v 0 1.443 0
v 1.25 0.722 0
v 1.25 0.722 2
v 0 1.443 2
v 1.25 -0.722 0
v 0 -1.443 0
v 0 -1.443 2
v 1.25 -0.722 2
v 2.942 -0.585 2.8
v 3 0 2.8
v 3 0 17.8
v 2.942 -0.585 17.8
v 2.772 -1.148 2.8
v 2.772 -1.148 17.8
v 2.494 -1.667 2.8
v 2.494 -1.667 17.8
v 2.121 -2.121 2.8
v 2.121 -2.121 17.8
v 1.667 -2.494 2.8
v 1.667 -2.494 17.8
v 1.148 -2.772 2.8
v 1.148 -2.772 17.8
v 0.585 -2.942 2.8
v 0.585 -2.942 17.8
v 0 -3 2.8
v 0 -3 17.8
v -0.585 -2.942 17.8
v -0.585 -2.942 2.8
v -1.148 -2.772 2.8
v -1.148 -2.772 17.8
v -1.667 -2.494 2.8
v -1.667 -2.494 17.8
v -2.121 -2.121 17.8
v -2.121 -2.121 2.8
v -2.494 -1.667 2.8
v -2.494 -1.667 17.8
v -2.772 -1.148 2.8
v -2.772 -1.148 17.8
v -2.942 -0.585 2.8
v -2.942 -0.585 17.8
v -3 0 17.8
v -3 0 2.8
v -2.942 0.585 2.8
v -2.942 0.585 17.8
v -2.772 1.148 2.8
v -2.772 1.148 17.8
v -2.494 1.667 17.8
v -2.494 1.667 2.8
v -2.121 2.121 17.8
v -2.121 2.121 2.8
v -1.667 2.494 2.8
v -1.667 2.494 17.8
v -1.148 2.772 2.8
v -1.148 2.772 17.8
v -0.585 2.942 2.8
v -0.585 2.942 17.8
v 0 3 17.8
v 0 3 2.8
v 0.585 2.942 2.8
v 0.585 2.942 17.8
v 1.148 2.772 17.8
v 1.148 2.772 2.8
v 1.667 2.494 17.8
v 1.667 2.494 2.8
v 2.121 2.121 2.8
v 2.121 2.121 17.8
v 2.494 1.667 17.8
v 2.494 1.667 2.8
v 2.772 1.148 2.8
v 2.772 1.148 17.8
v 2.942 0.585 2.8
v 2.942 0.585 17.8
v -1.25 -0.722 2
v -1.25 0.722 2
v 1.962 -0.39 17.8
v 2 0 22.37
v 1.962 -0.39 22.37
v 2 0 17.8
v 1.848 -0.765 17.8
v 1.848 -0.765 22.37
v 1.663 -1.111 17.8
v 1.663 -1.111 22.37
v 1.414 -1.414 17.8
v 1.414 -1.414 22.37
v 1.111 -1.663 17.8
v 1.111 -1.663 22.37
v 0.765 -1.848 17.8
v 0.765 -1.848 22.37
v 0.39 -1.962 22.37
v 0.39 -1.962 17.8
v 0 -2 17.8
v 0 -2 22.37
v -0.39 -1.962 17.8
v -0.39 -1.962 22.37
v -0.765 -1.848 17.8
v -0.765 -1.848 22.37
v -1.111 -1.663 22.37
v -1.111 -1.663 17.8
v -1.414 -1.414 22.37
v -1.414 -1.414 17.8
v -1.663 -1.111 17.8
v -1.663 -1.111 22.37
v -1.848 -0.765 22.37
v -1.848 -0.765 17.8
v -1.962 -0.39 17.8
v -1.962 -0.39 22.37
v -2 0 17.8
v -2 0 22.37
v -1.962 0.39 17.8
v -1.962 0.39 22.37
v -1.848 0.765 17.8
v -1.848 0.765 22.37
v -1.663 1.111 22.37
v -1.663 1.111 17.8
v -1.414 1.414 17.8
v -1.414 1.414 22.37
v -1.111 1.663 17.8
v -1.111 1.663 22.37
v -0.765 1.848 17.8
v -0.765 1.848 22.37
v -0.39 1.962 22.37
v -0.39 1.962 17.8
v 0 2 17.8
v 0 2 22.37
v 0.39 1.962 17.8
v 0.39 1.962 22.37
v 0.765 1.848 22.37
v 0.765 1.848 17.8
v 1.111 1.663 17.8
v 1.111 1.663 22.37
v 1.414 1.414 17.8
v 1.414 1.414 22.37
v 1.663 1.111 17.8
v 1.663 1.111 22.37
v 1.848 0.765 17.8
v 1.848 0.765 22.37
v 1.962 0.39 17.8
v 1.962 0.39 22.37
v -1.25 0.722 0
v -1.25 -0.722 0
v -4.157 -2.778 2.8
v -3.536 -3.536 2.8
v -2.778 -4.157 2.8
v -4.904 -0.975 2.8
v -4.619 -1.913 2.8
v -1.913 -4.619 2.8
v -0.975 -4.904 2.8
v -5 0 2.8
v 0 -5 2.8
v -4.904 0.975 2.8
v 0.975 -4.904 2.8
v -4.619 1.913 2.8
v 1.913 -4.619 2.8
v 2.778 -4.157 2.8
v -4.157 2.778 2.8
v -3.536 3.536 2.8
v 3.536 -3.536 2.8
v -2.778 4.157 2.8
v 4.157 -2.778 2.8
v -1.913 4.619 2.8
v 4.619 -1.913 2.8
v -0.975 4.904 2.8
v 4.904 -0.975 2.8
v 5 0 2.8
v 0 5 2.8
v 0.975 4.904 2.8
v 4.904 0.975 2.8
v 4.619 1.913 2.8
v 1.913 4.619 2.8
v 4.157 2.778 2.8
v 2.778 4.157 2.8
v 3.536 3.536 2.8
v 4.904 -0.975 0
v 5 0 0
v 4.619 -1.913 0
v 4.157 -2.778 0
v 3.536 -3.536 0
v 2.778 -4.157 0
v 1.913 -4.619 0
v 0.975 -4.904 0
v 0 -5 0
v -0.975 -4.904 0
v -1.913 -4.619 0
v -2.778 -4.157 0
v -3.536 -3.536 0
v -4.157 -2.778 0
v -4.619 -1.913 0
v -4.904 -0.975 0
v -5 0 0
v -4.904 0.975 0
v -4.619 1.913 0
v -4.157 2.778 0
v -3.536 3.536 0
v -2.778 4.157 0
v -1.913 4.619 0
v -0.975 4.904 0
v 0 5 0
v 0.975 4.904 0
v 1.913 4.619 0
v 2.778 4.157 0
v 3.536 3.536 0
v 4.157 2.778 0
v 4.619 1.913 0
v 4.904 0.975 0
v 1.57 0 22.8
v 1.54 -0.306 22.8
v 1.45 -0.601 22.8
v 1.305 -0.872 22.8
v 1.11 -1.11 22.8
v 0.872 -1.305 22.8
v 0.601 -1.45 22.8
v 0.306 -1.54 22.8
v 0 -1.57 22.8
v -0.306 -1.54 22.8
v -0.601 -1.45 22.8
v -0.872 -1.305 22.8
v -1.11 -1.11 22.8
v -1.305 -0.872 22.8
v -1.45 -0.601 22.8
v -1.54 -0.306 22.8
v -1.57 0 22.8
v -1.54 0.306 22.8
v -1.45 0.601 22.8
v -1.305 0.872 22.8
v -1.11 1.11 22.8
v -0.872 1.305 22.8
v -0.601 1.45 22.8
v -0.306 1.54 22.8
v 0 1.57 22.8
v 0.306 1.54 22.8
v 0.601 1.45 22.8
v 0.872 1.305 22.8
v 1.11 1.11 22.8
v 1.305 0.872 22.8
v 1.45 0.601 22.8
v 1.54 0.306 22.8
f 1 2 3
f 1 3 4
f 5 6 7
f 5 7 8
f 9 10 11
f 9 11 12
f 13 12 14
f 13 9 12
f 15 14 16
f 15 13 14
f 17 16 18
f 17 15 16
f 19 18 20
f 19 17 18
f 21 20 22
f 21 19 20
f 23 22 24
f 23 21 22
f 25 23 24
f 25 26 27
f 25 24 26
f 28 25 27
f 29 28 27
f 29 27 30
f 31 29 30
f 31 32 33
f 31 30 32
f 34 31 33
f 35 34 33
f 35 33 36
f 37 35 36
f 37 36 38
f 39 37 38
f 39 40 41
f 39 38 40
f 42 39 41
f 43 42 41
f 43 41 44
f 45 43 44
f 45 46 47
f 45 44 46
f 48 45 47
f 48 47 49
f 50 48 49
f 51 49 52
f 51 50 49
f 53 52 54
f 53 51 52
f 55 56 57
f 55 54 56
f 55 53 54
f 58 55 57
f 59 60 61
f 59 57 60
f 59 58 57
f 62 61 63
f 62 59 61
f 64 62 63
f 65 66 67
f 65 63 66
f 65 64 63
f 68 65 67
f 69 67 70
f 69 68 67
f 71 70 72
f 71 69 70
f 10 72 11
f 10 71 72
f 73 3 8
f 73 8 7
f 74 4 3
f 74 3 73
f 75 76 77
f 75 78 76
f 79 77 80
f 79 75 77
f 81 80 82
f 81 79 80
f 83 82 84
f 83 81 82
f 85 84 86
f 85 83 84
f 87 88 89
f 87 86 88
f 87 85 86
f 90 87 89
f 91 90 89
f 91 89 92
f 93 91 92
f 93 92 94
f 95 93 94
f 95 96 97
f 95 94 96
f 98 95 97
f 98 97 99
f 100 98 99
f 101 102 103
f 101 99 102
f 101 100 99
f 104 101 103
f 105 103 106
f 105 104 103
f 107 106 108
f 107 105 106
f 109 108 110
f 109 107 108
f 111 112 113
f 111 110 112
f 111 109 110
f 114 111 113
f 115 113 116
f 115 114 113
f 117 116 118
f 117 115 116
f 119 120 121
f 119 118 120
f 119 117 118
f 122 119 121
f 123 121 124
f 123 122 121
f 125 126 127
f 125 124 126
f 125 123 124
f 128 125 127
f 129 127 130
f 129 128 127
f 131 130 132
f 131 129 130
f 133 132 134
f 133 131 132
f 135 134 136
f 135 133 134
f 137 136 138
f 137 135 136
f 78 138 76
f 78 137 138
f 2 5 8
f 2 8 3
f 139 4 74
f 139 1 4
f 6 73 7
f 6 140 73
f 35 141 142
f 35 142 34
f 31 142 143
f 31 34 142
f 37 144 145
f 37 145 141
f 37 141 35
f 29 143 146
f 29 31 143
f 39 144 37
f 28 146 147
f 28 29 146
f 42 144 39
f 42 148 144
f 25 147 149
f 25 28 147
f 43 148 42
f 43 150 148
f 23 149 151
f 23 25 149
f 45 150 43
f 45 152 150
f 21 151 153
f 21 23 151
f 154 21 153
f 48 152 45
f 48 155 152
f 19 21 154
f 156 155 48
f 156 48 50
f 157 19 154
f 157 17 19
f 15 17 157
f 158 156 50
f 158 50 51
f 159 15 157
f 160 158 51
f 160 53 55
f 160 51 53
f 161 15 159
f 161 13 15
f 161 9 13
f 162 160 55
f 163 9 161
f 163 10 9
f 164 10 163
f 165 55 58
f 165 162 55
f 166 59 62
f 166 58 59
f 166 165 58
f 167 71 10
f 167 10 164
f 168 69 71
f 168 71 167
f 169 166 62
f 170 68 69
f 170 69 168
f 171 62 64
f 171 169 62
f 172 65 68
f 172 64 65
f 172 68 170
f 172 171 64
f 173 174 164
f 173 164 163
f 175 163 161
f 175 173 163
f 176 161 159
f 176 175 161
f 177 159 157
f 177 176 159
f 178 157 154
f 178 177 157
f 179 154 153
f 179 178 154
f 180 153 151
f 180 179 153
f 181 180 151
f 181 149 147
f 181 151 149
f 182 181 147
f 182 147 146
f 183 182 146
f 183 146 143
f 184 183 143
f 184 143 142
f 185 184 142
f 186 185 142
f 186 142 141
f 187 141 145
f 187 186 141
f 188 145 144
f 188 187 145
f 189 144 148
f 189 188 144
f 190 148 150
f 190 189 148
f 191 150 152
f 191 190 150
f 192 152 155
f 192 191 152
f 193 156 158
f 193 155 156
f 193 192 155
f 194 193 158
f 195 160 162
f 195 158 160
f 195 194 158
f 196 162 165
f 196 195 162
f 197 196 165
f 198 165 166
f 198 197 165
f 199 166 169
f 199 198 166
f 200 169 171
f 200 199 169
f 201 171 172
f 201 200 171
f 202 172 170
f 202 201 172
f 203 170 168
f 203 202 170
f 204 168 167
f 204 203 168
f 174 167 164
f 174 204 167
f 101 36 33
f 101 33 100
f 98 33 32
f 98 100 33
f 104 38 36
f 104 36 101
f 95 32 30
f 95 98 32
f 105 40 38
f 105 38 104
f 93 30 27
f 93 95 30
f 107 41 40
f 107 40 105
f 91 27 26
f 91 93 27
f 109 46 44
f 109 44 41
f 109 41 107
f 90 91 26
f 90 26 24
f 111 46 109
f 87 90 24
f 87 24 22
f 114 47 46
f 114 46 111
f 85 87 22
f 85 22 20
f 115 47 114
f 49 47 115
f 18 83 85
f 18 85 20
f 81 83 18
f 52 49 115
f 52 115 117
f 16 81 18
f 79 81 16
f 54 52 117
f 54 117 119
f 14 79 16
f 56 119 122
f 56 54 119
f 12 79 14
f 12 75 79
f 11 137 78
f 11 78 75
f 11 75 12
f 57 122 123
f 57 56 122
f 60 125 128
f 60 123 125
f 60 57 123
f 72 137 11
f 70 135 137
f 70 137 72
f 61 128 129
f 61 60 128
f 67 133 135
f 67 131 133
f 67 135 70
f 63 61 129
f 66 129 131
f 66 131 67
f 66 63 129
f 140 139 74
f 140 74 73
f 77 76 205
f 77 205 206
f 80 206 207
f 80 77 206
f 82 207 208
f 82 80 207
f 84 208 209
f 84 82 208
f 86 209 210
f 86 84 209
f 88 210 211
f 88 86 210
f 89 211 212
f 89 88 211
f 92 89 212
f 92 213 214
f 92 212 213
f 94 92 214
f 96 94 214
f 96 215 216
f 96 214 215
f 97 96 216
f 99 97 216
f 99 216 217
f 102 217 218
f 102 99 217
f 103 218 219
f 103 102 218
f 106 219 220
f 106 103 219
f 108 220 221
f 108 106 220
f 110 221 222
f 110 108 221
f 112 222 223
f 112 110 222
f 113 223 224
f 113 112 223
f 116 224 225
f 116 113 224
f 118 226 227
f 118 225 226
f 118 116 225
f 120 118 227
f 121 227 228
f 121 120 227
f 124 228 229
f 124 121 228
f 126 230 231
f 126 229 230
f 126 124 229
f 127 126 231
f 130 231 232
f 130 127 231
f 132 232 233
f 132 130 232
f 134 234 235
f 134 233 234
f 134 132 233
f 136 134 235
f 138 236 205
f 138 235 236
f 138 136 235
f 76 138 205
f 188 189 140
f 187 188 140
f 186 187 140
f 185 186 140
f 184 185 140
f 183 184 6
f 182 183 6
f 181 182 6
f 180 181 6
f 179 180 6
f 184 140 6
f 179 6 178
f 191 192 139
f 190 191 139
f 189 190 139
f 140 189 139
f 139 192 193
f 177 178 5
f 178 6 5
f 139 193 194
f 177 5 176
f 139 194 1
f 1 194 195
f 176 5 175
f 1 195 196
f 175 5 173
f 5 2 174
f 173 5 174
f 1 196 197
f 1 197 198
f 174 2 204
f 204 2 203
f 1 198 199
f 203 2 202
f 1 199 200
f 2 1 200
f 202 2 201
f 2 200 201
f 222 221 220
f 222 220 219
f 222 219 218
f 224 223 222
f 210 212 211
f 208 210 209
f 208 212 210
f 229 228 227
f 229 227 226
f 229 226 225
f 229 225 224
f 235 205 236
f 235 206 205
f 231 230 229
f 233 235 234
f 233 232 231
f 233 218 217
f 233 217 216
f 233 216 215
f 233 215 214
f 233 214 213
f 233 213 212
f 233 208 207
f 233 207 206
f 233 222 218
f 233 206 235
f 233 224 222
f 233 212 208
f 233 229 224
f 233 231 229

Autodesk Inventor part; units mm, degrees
ref_plane "YZ Plane" through (0, 0, 0) normal (1, 0, 0) x (0, 1, 0)
ref_plane "XZ Plane" through (0, 0, 0) normal (0, 1, 0) x (-1, 0, 0)
ref_plane "XY Plane" through (0, 0, 0) normal (0, 0, 1) x (1, 0, 0)
sketch "Sketch1" plane through (0, 0, 0) normal (0, 1, 0) x (-1, 0, 0)
  line L0 (0, 0) -> (0, 22.8)
  line L1 (0, 22.8) -> (-2, 22.8)
  line L2 (-2, 22.8) -> (-2, 17.8)
  line L3 (-2, 17.8) -> (-3, 17.8)
  line L4 (-3, 17.8) -> (-3, 2.8)
  line L5 (-3, 2.8) -> (-5, 2.8)
  line L6 (-5, 2.8) -> (-5, 0)
  line L7 (-5, 0) -> (0, 0)
  dimension "d0" = 10
  dimension "d1" = 6
  dimension "d2" = 4
  dimension "d3" = 5
  dimension "d4" = 15
  dimension "d5" = 2.8
revolve "Revolution1" add sketch "Sketch1" angle 360 about axis through (0, 0, 0) along (0, 0, 1)
thread "Thread1" size "M4x0.7" class "6g" standard "ANSI Metric M Profile" length 6 offset 1.2
sketch "Sketch2" plane through (0, 0, 0) normal (0, 0, -1) x (-1, 0, 0)
  line L0 (0, 1.4434) -> (1.25, 0.7217)
  line L1 (1.25, 0.7217) -> (1.25, -0.7217)
  line L2 (1.25, -0.7217) -> (0, -1.4434)
  line L3 (0, -1.4434) -> (-1.25, -0.7217)
  line L4 (-1.25, -0.7217) -> (-1.25, 0.7217)
  line L5 (-1.25, 0.7217) -> (0, 1.4434)
  point P0 (0, 0)
  point P1 (0, 0)
  dimension "d9" = 2.5
extrude "Extrusion1" cut sketch "Sketch2" against normal blind 2
chamfer "Chamfer1" distance 0.43 angle 45 1 edges at (-2, 0, 22.8)
properties part number "DBTSY4-15-5-DHC" material "Stainless Steel AISI 304"
